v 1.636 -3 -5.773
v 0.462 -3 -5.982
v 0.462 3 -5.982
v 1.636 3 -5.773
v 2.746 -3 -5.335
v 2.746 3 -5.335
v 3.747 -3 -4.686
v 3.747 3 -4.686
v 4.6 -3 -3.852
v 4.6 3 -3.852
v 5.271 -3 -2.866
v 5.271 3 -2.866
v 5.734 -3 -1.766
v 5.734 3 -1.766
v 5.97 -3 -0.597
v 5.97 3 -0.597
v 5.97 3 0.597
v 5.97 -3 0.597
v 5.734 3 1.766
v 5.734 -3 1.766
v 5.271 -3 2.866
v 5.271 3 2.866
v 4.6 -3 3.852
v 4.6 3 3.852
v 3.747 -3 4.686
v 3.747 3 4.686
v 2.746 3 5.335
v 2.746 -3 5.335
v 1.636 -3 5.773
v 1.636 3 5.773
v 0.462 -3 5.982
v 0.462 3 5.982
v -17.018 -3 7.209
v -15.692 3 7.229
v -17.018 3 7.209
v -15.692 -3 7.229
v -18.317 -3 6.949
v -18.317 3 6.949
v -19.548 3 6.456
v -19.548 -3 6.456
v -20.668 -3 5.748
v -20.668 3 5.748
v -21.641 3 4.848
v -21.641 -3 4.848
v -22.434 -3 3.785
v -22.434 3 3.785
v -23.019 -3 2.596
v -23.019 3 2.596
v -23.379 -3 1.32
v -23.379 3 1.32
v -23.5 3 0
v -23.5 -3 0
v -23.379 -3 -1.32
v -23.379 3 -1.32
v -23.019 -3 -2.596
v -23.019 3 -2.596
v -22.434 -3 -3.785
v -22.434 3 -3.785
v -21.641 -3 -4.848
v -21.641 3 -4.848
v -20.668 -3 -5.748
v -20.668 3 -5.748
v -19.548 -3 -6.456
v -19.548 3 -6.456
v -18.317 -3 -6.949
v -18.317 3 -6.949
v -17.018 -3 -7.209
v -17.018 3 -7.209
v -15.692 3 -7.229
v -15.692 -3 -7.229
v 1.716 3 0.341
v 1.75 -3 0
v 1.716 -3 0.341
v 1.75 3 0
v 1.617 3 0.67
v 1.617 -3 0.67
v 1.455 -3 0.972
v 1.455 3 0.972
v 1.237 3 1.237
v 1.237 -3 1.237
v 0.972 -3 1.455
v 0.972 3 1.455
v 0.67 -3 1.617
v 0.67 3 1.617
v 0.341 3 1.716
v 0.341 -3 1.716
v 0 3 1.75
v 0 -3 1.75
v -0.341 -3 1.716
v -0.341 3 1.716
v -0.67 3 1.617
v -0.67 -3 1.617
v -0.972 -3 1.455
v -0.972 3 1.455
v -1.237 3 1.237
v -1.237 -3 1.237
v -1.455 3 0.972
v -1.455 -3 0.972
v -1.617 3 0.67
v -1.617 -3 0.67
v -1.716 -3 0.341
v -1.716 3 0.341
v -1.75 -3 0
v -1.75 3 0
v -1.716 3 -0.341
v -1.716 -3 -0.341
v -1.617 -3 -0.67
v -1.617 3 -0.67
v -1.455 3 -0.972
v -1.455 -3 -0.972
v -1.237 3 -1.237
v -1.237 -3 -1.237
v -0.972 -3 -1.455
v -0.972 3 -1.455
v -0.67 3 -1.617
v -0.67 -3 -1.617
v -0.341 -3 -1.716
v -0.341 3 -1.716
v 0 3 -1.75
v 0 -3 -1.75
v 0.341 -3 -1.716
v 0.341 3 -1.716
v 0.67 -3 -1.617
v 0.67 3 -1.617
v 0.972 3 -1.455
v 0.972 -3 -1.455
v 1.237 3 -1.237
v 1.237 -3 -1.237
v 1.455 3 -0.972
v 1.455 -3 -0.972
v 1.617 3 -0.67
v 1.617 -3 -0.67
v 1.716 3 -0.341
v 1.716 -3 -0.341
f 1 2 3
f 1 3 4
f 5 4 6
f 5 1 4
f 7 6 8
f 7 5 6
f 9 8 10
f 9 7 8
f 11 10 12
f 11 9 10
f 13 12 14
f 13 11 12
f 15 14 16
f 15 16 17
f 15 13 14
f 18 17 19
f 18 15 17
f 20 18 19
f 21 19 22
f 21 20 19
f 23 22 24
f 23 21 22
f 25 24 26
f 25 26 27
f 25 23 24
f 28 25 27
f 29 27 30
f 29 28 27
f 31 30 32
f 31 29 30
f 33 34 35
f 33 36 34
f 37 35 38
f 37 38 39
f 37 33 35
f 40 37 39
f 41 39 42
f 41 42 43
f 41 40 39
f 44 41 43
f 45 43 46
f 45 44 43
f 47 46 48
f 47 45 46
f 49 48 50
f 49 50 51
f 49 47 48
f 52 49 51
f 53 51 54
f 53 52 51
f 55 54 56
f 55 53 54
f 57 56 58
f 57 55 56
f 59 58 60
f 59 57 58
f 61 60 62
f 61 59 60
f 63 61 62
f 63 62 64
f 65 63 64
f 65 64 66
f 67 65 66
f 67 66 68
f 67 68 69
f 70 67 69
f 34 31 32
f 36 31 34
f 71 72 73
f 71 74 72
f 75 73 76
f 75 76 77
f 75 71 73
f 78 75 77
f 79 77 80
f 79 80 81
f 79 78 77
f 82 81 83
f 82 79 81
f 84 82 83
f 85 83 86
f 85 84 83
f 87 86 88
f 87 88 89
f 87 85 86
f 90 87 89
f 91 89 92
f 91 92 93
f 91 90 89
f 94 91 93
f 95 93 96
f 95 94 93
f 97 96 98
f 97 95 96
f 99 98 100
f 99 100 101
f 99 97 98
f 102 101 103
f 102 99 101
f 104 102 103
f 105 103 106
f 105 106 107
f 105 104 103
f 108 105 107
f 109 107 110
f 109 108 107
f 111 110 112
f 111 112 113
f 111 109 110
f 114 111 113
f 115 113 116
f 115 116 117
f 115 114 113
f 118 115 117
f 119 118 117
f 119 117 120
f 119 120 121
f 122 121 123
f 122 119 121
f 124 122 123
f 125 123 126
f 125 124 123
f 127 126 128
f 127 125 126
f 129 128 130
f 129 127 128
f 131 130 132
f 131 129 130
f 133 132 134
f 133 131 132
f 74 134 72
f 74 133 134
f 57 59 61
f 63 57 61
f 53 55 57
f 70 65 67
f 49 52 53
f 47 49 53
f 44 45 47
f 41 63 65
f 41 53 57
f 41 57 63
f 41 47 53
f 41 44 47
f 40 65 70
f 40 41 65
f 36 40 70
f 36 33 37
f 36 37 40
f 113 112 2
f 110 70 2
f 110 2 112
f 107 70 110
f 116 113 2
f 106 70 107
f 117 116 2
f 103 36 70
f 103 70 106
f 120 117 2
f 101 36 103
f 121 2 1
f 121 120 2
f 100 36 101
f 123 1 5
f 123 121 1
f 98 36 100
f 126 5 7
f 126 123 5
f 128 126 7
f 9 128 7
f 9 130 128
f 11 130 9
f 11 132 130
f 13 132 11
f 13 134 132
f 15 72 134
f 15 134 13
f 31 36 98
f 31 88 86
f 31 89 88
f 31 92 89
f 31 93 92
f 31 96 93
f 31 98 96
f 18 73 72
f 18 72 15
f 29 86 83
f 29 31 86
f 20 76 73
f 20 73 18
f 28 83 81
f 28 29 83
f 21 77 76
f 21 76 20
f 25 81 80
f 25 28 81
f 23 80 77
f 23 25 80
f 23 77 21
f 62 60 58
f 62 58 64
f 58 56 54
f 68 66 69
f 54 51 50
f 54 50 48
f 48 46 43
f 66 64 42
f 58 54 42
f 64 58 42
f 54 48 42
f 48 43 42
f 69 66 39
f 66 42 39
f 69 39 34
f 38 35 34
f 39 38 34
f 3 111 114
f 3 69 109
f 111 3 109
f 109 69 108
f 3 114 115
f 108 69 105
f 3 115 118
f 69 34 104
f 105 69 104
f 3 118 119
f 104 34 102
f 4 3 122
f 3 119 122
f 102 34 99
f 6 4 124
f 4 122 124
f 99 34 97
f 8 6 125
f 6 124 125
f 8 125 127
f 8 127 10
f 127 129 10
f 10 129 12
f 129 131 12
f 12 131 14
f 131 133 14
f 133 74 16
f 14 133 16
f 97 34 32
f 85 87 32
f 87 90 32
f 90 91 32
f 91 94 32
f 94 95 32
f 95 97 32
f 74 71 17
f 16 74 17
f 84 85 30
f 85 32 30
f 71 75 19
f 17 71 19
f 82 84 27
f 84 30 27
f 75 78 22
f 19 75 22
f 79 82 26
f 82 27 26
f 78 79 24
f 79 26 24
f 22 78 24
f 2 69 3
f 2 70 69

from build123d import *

# Parameters (mm, degrees)
F0_R     = 1.75
F1_DEPTH = 3


with BuildPart() as f1:
    # F0 (on Front) → F1 (new body, symmetric)
    with BuildSketch(Plane.XZ):
        with BuildLine():
            Line((-15.692308, -7.228518), (0.461538, -5.982222))
            ThreePointArc((0.461538, -5.982222), (6, 0), (0.461538, 5.982222))
            Line((0.461538, 5.982222), (-15.692308, 7.228518))
            ThreePointArc((-15.692308, 7.228518), (-23.5, 0), (-15.692308, -7.228518))
        make_face()
        Circle(F0_R, mode=Mode.SUBTRACT)
    extrude(amount=F1_DEPTH, both=True)


solid = f1.part
